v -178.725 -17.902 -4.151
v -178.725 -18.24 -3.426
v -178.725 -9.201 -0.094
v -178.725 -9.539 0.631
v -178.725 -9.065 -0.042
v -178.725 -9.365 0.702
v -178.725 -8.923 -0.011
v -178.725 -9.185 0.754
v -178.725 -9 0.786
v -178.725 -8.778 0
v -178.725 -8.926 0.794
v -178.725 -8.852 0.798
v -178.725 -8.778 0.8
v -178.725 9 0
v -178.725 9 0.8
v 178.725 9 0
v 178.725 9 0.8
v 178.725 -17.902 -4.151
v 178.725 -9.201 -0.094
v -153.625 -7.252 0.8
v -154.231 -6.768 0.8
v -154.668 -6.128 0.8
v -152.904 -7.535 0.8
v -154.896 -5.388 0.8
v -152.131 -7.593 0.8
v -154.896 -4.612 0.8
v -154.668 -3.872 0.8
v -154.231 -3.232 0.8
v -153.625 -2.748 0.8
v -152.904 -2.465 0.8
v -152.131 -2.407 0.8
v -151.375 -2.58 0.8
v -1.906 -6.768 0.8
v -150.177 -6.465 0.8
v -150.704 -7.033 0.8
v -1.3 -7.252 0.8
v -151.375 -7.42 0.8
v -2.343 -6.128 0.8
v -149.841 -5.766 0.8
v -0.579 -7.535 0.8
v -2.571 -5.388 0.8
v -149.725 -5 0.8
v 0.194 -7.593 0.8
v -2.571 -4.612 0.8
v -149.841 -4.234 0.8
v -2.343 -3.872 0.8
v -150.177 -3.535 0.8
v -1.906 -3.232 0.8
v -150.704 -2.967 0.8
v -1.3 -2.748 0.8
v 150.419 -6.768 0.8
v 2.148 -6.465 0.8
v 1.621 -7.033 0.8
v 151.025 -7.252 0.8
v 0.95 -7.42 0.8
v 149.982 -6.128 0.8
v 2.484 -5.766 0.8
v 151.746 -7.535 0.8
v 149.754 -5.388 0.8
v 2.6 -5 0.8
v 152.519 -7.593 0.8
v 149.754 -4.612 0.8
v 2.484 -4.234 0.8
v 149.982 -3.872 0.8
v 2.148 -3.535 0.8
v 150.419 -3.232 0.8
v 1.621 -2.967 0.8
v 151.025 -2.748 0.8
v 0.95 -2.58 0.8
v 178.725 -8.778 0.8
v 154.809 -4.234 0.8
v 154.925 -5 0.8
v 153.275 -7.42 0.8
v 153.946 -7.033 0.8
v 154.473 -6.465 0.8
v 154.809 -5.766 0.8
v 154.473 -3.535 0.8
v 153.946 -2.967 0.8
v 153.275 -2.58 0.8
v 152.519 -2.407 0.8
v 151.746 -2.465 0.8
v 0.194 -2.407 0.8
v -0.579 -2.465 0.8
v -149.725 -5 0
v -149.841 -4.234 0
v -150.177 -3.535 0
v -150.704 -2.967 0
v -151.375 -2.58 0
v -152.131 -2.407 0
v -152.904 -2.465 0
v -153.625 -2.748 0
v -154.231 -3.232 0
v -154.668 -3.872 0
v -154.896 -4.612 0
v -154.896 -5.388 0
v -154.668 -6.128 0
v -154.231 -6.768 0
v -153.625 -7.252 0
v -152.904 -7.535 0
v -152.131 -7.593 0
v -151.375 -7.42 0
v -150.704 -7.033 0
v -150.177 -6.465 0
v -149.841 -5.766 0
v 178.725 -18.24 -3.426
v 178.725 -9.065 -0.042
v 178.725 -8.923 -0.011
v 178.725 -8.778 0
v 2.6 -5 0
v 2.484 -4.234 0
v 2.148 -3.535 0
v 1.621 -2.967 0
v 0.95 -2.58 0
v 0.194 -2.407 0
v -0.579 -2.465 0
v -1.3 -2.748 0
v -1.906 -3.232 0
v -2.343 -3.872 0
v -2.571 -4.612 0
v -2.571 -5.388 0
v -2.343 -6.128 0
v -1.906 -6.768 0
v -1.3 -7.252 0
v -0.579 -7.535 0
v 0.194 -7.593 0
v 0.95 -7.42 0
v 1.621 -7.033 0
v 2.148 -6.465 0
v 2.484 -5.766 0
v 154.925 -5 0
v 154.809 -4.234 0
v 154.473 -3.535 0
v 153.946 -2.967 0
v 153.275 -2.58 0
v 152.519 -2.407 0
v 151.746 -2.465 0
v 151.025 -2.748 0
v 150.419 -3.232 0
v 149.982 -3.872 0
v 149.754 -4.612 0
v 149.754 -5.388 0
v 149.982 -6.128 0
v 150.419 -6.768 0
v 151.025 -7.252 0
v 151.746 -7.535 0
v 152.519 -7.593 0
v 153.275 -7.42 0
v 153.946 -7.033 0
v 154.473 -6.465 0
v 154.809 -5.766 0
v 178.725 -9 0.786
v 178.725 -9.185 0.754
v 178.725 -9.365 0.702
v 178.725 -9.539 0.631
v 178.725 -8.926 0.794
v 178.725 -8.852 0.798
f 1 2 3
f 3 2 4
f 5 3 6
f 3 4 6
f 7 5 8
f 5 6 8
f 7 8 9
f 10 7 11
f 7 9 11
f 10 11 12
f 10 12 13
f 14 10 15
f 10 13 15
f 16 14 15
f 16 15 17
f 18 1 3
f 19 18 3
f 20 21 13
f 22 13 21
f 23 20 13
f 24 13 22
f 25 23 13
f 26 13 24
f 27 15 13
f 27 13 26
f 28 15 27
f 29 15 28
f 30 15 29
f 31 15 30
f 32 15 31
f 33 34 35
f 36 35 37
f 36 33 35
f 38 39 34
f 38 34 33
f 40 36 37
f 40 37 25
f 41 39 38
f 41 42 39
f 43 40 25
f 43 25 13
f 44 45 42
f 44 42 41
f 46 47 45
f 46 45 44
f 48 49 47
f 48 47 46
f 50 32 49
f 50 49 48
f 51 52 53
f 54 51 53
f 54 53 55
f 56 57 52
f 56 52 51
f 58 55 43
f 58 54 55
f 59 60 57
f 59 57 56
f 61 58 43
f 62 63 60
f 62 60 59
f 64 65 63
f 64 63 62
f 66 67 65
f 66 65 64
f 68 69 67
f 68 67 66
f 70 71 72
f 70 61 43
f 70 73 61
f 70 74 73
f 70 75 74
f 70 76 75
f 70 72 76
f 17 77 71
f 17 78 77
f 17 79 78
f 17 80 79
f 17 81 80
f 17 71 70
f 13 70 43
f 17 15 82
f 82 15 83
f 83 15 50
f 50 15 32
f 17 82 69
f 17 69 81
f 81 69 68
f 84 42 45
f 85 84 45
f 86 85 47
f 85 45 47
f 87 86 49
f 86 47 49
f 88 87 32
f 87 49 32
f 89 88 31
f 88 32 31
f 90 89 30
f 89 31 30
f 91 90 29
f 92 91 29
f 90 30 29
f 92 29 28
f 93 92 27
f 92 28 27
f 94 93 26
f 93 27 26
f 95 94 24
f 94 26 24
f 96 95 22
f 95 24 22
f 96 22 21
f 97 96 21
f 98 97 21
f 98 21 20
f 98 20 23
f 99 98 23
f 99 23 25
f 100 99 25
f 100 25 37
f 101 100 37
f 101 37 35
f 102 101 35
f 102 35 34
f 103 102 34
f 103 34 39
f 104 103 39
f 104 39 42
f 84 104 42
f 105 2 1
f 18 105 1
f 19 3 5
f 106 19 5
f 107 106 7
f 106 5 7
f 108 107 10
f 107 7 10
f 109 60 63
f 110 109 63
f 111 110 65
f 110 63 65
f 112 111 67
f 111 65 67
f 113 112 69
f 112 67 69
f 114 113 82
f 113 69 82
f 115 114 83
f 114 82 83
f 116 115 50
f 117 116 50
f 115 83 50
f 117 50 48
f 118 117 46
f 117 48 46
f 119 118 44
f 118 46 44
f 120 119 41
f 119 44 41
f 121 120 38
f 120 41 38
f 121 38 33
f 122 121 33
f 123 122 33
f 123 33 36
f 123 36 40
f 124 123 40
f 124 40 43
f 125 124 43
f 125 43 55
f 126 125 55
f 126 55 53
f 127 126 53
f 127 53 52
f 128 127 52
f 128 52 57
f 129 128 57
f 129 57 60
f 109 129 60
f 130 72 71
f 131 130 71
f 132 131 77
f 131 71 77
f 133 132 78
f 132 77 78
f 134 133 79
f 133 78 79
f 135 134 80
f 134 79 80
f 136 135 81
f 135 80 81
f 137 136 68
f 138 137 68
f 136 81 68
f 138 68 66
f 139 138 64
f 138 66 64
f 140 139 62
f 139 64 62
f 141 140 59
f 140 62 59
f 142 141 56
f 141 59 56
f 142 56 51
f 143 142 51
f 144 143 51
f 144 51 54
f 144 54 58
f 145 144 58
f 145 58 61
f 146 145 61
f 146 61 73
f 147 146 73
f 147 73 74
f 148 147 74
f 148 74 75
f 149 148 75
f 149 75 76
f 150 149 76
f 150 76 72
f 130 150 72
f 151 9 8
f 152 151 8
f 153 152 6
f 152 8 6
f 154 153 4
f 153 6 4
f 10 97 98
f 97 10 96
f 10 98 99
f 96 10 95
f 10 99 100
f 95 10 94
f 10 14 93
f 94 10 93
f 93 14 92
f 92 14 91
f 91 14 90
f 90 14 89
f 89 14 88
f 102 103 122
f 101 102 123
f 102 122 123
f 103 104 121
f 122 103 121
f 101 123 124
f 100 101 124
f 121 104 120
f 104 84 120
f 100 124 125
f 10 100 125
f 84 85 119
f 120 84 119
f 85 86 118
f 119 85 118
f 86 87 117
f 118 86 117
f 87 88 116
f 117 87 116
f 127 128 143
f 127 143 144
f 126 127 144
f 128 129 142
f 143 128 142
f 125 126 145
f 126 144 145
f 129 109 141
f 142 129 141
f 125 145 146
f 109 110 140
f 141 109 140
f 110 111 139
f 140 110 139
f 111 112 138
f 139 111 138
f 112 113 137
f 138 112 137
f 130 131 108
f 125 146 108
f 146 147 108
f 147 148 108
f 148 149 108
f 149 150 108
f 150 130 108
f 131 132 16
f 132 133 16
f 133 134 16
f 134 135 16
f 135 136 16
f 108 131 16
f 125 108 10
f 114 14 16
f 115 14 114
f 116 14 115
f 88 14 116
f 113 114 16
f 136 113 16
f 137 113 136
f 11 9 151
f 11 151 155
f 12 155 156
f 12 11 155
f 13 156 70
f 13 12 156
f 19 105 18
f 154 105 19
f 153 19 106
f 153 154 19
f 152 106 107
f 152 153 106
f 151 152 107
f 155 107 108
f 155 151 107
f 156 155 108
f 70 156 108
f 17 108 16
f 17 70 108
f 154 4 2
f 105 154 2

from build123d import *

# Parameters (mm, degrees)
SKETCH_1_W               = 357.45
SKETCH_1_H               = 18
EXTRUDE_1_DEPTH          = 0.8
SKETCH_8_R               = 2.6
CUT_EXTRUDE_1_DEPTH      = 179.953249831
SM_START                 = -178.725
SM_EDGE_FLANGE_1_DEPTH   = 357.45
SM_EDGE_FLANGE_1_2_DEPTH = 357.45
SKETCH_12_R              = 2.6
CUT_EXTRUDE_2_DEPTH      = 10


# Read off the part's stored shape, not the designer's step: Ребро-кромка1
with BuildPart() as part:
    # Sketch 1 → Вытянуть1 (new body)
    with BuildSketch(Plane.XY):
        Rectangle(SKETCH_1_W, SKETCH_1_H)
    extrude(amount=EXTRUDE_1_DEPTH)

    # Эскиз8 → Вырез-Вытянуть1 (cut, through all)
    with BuildSketch(Plane.XY.offset(0.8)):
        with Locations((152.325, -5)):
            Circle(SKETCH_8_R)
        with Locations((-152.325, -5)):
            Circle(SKETCH_8_R)
    extrude(amount=-CUT_EXTRUDE_1_DEPTH, mode=Mode.SUBTRACT)

    # Ребро-кромка1 outline → Ребро-кромка1 (cut)
    with BuildSketch(Plane.YZ.offset(SM_START)):
        with BuildLine():
            Line((-9, 0.8), (-9, 0.786295462))
            ThreePointArc((-9, 0.786295462), (-8.889364261, 0.796570599), (-8.778305337, 0.8))
            Line((-8.778305337, 0.8), (-9, 0.8))
        make_face()
    extrude(amount=SM_EDGE_FLANGE_1_DEPTH, mode=Mode.SUBTRACT)

    # Sm Edge Flange 1 2 outline → Sm Edge Flange 1 2 (add)
    with BuildSketch(Plane.YZ.offset(SM_START)):
        with BuildLine():
            ThreePointArc((-9, 0.786295462), (-9.275580767, 0.729947152), (-9.539018208, 0.631354017))
            Line((-9.539018208, 0.631354017), (-18.2404336, -3.426182617))
            Line((-18.2404336, -3.426182617), (-17.902338991, -4.151228847))
            Line((-17.902338991, -4.151228847), (-9.200923599, -0.093692213))
            ThreePointArc((-9.200923599, -0.093692213), (-8.994744951, -0.023703993), (-8.778305337, 0))
            Line((-8.778305337, 0), (-9, 0))
            Line((-9, 0), (-9, 0.786295462))
        make_face()
    extrude(amount=SM_EDGE_FLANGE_1_2_DEPTH)

    # Эскиз12 → Вырез-Вытянуть2 (cut)
    with BuildSketch(Plane.XY.offset(0.8)):
        with Locations((0, -5)):
            Circle(SKETCH_12_R)
    extrude(amount=-CUT_EXTRUDE_2_DEPTH, mode=Mode.SUBTRACT)


solid = part.part
